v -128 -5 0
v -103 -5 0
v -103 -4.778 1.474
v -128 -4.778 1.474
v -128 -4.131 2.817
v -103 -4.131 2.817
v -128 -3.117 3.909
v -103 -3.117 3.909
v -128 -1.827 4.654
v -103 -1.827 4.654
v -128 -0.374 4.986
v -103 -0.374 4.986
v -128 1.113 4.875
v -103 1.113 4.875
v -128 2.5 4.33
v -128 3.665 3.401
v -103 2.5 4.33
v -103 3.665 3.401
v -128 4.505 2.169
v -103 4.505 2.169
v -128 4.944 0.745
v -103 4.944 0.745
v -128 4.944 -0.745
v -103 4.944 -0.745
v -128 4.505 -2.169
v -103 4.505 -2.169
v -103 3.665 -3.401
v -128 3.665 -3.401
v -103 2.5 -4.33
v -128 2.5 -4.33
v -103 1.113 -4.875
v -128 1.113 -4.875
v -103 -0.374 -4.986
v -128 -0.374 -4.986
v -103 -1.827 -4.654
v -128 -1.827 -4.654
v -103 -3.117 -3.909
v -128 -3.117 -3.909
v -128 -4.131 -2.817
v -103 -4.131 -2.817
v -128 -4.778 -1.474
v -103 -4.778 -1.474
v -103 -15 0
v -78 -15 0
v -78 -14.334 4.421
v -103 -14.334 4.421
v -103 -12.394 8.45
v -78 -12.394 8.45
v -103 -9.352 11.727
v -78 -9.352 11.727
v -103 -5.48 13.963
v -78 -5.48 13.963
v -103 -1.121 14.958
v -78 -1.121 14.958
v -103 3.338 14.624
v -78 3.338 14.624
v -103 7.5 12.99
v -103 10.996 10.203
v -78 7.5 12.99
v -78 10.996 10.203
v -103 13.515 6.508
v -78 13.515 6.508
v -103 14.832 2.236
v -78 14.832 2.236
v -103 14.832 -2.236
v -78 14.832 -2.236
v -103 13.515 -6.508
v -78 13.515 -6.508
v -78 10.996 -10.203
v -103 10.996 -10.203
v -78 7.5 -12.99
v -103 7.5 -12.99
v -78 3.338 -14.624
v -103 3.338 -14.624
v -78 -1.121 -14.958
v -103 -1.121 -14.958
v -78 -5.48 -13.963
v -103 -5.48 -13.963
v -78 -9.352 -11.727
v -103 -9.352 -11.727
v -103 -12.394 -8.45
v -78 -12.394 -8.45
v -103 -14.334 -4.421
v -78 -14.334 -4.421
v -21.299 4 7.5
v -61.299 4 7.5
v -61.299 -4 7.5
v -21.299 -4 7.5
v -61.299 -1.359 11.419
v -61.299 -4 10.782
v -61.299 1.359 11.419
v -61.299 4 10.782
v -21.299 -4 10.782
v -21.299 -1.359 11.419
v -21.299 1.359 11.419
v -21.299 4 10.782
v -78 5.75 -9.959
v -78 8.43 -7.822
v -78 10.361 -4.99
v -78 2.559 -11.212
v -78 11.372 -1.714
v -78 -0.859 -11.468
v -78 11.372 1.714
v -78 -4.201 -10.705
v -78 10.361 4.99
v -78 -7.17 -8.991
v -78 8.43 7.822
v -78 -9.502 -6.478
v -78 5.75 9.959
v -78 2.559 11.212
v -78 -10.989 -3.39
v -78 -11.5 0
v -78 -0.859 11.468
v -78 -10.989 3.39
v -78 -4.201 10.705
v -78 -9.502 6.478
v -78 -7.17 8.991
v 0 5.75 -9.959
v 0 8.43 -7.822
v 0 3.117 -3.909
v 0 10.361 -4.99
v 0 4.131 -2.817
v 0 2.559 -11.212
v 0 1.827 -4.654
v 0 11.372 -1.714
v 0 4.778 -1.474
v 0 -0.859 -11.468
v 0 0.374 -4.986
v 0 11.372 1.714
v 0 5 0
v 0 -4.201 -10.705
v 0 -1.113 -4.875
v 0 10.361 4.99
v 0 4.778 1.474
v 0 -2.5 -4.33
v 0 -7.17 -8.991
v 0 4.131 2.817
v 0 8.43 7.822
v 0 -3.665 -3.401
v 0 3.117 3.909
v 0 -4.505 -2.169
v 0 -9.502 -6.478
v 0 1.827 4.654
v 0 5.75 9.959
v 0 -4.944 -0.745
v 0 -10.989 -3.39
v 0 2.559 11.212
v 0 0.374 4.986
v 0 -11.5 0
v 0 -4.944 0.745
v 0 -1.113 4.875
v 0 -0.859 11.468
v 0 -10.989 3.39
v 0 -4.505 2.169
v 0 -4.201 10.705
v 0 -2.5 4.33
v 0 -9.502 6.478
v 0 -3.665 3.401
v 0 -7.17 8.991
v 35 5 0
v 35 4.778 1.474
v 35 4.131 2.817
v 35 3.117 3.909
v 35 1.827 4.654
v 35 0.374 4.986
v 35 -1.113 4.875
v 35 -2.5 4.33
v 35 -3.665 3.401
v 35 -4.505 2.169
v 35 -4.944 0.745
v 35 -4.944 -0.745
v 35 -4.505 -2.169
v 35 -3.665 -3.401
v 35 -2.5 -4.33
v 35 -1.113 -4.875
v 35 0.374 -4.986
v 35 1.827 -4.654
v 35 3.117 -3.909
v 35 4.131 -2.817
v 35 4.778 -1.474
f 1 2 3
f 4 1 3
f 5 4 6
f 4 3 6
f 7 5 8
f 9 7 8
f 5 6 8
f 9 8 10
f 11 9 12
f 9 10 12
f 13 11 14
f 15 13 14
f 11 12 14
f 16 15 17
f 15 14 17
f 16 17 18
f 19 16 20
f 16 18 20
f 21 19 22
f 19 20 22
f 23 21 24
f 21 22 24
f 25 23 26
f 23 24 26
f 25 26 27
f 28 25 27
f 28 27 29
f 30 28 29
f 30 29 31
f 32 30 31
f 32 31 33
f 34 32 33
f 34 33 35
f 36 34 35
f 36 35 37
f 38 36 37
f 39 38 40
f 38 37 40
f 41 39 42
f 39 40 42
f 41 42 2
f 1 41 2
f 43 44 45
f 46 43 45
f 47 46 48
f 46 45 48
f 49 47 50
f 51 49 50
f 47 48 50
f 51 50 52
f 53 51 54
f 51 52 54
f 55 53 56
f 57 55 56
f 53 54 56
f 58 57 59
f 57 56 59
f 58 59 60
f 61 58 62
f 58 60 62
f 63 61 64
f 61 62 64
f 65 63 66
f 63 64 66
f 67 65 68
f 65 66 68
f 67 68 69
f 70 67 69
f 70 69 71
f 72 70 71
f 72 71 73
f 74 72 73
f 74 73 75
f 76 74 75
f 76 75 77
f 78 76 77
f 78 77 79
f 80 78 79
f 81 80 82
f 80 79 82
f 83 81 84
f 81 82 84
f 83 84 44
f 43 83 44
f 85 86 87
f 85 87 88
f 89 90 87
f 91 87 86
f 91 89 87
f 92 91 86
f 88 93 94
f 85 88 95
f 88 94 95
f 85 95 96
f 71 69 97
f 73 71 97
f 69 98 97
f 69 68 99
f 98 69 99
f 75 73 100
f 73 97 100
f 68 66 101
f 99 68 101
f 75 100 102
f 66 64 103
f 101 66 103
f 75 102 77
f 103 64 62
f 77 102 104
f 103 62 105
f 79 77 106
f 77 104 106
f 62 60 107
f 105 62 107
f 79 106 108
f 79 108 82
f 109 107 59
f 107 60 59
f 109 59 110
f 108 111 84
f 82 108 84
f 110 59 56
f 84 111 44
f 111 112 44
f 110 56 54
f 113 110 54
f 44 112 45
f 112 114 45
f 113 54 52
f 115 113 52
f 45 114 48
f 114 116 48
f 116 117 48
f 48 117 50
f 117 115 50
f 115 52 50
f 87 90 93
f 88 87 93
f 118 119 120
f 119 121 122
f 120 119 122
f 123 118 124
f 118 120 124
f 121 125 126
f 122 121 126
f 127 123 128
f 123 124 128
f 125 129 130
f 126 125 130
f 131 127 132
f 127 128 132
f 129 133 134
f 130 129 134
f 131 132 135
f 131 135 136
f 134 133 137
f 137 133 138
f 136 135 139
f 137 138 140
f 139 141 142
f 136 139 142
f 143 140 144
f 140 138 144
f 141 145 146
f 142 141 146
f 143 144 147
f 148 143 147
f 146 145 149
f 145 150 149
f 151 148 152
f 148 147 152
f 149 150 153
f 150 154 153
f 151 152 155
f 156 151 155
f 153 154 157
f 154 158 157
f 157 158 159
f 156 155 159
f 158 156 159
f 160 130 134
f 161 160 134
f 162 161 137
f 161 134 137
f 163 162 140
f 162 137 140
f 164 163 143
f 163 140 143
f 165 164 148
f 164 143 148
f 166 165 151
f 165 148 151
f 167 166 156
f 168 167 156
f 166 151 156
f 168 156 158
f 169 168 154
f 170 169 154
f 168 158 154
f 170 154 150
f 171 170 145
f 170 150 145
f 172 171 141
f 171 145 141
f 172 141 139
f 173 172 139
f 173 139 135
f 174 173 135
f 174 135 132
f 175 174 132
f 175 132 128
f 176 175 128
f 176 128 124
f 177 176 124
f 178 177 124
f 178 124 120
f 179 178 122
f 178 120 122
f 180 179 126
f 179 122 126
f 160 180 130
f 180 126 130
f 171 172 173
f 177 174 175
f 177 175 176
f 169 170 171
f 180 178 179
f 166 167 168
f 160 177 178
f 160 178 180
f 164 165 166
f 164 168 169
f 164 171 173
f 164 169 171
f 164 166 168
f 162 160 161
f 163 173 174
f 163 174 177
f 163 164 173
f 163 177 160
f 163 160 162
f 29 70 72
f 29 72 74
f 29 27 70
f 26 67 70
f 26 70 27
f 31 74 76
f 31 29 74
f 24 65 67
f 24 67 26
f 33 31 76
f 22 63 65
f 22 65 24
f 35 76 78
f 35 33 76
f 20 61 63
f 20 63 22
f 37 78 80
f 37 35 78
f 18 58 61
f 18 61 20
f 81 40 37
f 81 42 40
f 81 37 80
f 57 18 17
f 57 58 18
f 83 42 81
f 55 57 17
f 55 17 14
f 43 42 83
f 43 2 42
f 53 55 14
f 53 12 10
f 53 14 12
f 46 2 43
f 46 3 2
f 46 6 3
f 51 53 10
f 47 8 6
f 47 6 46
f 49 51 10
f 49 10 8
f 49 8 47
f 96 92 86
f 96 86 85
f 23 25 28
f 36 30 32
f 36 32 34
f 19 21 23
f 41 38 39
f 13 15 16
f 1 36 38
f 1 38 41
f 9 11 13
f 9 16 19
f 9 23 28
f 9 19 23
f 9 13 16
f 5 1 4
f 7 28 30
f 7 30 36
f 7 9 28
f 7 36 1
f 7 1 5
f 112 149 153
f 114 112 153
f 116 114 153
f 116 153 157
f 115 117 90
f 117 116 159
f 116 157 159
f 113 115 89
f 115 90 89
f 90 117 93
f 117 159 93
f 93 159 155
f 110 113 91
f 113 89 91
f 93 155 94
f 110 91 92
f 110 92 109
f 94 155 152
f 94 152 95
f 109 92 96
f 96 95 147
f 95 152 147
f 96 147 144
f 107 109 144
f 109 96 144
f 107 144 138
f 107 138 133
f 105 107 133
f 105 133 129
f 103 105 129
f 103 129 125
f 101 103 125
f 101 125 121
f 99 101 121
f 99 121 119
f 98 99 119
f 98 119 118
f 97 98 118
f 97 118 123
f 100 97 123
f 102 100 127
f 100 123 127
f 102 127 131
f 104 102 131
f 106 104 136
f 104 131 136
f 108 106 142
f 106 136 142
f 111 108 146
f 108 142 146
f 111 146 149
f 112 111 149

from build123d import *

# Parameters (mm, degrees)
F0_R      = 5
F1_DEPTH  = 35
F2_R      = 11.5
F3_DEPTH  = 78
F4_R      = 15
F5_DEPTH  = 25
F6_R      = 5
F7_DEPTH  = 25
F9_W      = 40
F9_H      = 8
F10_DEPTH = 4


with BuildPart() as f1:
    # F0 (on Right) → F1 (new body)
    with BuildSketch(Plane.YZ):
        Circle(F0_R)
    extrude(amount=F1_DEPTH)

    # F2 (on face) → F3 (join)
    with BuildSketch(Plane(origin=(0, 0, 0), x_dir=(0, -1, 0), z_dir=(-1, 0, 0))):
        Circle(F2_R)
    extrude(amount=F3_DEPTH)

    # F4 (on face) → F5 (join)
    with BuildSketch(Plane(origin=(-78, 0, 0), x_dir=(0, -1, 0), z_dir=(-1, 0, 0))):
        Circle(F4_R)
    extrude(amount=F5_DEPTH)

    # F6 (on face) → F7 (join)
    with BuildSketch(Plane(origin=(-103, 0, 0), x_dir=(0, -1, 0), z_dir=(-1, 0, 0))):
        Circle(F6_R)
    extrude(amount=F7_DEPTH)

    # F9 (on offset) → F10 (cut)
    with BuildSketch(Plane.XY.offset(11.5)):
        with Locations((-41.2988585503, 0)):
            Rectangle(F9_W, F9_H)
    extrude(amount=-F10_DEPTH, mode=Mode.SUBTRACT)


solid = f1.part
